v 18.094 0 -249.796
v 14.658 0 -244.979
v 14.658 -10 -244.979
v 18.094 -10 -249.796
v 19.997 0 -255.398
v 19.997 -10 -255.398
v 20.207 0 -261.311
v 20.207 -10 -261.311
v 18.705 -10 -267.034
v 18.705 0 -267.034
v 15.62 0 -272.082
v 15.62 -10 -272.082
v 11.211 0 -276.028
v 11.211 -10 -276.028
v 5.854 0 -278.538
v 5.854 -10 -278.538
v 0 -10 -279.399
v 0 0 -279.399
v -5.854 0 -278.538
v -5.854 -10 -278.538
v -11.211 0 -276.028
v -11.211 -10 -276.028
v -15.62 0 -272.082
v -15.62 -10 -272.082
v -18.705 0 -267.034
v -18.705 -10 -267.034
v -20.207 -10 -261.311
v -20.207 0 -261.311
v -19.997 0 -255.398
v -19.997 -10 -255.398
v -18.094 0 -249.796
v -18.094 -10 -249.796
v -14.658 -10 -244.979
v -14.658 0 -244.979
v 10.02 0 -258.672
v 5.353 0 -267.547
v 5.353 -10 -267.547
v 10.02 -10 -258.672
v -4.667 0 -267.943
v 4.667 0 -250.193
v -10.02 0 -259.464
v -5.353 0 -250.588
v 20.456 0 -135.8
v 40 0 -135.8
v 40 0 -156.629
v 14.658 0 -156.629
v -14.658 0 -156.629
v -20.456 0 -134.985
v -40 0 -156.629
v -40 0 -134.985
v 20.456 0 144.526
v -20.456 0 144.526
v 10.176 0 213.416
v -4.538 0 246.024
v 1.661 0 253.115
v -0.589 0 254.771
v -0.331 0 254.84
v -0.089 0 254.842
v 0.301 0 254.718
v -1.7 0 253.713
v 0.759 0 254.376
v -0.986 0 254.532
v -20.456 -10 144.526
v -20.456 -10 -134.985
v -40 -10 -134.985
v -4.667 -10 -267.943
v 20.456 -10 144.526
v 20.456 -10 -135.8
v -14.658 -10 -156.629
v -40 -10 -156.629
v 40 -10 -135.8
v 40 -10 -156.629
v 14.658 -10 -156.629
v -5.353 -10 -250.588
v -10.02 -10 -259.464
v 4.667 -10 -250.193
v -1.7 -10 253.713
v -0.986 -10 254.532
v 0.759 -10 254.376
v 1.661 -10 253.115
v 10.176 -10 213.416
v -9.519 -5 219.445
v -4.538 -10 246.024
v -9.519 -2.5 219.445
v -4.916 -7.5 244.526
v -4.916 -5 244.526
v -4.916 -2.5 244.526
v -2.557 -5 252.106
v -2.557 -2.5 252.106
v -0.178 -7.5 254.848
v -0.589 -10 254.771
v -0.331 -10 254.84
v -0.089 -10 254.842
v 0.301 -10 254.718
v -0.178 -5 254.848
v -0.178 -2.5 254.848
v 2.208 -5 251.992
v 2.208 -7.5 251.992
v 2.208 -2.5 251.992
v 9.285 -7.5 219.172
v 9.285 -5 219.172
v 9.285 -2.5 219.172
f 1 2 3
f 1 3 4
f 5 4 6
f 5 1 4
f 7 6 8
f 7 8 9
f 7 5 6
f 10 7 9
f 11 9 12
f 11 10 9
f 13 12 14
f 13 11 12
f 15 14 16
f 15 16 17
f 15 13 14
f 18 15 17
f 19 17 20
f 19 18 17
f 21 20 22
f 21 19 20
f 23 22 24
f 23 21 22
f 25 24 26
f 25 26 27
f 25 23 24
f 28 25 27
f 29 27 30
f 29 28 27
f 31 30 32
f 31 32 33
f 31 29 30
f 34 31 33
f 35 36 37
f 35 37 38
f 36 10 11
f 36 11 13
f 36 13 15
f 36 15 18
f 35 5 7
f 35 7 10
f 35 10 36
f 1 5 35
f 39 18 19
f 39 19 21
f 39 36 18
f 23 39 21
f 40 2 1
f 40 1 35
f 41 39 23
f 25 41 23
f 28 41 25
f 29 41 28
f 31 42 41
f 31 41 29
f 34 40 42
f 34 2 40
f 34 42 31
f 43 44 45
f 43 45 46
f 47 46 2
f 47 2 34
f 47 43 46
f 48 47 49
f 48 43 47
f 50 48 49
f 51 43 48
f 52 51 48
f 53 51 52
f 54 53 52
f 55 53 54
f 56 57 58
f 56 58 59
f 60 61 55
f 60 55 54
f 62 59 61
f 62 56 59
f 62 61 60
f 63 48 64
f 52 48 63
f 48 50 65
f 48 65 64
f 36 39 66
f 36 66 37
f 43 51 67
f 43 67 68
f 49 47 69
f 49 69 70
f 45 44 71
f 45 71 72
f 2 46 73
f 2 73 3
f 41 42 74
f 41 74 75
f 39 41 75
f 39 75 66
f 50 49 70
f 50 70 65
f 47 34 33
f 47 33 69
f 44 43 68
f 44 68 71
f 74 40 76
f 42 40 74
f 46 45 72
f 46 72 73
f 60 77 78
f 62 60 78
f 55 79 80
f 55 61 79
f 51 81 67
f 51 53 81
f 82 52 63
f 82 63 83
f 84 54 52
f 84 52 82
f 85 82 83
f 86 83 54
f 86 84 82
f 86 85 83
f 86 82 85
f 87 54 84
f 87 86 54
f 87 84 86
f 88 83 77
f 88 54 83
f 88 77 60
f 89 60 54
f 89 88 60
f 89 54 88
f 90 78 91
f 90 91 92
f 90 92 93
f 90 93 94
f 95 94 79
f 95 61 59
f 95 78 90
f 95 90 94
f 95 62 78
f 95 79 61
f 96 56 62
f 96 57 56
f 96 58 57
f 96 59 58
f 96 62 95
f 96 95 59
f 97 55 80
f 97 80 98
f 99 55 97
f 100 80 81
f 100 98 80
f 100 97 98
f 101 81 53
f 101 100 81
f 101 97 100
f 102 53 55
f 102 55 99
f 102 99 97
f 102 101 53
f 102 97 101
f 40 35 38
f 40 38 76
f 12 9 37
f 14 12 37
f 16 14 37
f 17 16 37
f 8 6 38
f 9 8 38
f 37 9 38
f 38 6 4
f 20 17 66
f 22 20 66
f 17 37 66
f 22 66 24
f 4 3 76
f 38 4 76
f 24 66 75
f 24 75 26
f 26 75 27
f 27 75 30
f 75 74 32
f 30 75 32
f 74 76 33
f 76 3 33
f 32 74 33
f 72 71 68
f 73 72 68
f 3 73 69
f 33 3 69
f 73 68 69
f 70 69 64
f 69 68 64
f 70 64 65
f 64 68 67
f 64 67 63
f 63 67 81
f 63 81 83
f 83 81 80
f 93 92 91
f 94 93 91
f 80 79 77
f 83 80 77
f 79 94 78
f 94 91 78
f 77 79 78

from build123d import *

# Parameters (mm, degrees)
PAD_DEPTH = 10


with BuildPart() as part:
    # Sketch → Pad (new body)
    with BuildSketch(Plane.XZ):
        with BuildLine():
            Line((-20.4562, -134.984811), (-20.4562, 144.525857))
            add(Edge.make_bspline(
                [(-20.4562, 144.525857), (-15.351442, 176.525857), (-9.682975, 223.163129), (-0.193928, 270.808012), (9.393321, 222.695651), (15.351442, 176.525857), (20.4562, 144.525857)],
                knots=[0, 0, 0, 0, 0.25, 0.5, 0.75, 1, 1, 1, 1], degree=3))
            Line((20.4562, 144.525857), (20.4562, -135.800149))
            Line((20.4562, -135.800149), (40, -135.800149))
            Line((40, -135.800149), (40, -156.629494))
            Line((40, -156.629494), (14.657939, -156.629494))
            Line((14.657939, -156.629494), (14.657939, -244.979341))
            ThreePointArc((14.657939, -244.979341), (0, -279.398631), (-14.657939, -244.979341))
            Line((-14.657939, -244.979341), (-14.657939, -156.629494))
            Line((-14.657939, -156.629494), (-40, -156.629494))
            Line((-40, -156.629494), (-40, -134.984811))
            Line((-40, -134.984811), (-20.4562, -134.984811))
        make_face()
        Polygon((5.352593, -267.547272), (10.019699, -258.672075), (4.667106, -250.192644), (-5.352593, -250.58841), (-10.019699, -259.463607), (-4.667106, -267.943038), align=None, mode=Mode.SUBTRACT)
    extrude(amount=PAD_DEPTH)


solid = part.part
